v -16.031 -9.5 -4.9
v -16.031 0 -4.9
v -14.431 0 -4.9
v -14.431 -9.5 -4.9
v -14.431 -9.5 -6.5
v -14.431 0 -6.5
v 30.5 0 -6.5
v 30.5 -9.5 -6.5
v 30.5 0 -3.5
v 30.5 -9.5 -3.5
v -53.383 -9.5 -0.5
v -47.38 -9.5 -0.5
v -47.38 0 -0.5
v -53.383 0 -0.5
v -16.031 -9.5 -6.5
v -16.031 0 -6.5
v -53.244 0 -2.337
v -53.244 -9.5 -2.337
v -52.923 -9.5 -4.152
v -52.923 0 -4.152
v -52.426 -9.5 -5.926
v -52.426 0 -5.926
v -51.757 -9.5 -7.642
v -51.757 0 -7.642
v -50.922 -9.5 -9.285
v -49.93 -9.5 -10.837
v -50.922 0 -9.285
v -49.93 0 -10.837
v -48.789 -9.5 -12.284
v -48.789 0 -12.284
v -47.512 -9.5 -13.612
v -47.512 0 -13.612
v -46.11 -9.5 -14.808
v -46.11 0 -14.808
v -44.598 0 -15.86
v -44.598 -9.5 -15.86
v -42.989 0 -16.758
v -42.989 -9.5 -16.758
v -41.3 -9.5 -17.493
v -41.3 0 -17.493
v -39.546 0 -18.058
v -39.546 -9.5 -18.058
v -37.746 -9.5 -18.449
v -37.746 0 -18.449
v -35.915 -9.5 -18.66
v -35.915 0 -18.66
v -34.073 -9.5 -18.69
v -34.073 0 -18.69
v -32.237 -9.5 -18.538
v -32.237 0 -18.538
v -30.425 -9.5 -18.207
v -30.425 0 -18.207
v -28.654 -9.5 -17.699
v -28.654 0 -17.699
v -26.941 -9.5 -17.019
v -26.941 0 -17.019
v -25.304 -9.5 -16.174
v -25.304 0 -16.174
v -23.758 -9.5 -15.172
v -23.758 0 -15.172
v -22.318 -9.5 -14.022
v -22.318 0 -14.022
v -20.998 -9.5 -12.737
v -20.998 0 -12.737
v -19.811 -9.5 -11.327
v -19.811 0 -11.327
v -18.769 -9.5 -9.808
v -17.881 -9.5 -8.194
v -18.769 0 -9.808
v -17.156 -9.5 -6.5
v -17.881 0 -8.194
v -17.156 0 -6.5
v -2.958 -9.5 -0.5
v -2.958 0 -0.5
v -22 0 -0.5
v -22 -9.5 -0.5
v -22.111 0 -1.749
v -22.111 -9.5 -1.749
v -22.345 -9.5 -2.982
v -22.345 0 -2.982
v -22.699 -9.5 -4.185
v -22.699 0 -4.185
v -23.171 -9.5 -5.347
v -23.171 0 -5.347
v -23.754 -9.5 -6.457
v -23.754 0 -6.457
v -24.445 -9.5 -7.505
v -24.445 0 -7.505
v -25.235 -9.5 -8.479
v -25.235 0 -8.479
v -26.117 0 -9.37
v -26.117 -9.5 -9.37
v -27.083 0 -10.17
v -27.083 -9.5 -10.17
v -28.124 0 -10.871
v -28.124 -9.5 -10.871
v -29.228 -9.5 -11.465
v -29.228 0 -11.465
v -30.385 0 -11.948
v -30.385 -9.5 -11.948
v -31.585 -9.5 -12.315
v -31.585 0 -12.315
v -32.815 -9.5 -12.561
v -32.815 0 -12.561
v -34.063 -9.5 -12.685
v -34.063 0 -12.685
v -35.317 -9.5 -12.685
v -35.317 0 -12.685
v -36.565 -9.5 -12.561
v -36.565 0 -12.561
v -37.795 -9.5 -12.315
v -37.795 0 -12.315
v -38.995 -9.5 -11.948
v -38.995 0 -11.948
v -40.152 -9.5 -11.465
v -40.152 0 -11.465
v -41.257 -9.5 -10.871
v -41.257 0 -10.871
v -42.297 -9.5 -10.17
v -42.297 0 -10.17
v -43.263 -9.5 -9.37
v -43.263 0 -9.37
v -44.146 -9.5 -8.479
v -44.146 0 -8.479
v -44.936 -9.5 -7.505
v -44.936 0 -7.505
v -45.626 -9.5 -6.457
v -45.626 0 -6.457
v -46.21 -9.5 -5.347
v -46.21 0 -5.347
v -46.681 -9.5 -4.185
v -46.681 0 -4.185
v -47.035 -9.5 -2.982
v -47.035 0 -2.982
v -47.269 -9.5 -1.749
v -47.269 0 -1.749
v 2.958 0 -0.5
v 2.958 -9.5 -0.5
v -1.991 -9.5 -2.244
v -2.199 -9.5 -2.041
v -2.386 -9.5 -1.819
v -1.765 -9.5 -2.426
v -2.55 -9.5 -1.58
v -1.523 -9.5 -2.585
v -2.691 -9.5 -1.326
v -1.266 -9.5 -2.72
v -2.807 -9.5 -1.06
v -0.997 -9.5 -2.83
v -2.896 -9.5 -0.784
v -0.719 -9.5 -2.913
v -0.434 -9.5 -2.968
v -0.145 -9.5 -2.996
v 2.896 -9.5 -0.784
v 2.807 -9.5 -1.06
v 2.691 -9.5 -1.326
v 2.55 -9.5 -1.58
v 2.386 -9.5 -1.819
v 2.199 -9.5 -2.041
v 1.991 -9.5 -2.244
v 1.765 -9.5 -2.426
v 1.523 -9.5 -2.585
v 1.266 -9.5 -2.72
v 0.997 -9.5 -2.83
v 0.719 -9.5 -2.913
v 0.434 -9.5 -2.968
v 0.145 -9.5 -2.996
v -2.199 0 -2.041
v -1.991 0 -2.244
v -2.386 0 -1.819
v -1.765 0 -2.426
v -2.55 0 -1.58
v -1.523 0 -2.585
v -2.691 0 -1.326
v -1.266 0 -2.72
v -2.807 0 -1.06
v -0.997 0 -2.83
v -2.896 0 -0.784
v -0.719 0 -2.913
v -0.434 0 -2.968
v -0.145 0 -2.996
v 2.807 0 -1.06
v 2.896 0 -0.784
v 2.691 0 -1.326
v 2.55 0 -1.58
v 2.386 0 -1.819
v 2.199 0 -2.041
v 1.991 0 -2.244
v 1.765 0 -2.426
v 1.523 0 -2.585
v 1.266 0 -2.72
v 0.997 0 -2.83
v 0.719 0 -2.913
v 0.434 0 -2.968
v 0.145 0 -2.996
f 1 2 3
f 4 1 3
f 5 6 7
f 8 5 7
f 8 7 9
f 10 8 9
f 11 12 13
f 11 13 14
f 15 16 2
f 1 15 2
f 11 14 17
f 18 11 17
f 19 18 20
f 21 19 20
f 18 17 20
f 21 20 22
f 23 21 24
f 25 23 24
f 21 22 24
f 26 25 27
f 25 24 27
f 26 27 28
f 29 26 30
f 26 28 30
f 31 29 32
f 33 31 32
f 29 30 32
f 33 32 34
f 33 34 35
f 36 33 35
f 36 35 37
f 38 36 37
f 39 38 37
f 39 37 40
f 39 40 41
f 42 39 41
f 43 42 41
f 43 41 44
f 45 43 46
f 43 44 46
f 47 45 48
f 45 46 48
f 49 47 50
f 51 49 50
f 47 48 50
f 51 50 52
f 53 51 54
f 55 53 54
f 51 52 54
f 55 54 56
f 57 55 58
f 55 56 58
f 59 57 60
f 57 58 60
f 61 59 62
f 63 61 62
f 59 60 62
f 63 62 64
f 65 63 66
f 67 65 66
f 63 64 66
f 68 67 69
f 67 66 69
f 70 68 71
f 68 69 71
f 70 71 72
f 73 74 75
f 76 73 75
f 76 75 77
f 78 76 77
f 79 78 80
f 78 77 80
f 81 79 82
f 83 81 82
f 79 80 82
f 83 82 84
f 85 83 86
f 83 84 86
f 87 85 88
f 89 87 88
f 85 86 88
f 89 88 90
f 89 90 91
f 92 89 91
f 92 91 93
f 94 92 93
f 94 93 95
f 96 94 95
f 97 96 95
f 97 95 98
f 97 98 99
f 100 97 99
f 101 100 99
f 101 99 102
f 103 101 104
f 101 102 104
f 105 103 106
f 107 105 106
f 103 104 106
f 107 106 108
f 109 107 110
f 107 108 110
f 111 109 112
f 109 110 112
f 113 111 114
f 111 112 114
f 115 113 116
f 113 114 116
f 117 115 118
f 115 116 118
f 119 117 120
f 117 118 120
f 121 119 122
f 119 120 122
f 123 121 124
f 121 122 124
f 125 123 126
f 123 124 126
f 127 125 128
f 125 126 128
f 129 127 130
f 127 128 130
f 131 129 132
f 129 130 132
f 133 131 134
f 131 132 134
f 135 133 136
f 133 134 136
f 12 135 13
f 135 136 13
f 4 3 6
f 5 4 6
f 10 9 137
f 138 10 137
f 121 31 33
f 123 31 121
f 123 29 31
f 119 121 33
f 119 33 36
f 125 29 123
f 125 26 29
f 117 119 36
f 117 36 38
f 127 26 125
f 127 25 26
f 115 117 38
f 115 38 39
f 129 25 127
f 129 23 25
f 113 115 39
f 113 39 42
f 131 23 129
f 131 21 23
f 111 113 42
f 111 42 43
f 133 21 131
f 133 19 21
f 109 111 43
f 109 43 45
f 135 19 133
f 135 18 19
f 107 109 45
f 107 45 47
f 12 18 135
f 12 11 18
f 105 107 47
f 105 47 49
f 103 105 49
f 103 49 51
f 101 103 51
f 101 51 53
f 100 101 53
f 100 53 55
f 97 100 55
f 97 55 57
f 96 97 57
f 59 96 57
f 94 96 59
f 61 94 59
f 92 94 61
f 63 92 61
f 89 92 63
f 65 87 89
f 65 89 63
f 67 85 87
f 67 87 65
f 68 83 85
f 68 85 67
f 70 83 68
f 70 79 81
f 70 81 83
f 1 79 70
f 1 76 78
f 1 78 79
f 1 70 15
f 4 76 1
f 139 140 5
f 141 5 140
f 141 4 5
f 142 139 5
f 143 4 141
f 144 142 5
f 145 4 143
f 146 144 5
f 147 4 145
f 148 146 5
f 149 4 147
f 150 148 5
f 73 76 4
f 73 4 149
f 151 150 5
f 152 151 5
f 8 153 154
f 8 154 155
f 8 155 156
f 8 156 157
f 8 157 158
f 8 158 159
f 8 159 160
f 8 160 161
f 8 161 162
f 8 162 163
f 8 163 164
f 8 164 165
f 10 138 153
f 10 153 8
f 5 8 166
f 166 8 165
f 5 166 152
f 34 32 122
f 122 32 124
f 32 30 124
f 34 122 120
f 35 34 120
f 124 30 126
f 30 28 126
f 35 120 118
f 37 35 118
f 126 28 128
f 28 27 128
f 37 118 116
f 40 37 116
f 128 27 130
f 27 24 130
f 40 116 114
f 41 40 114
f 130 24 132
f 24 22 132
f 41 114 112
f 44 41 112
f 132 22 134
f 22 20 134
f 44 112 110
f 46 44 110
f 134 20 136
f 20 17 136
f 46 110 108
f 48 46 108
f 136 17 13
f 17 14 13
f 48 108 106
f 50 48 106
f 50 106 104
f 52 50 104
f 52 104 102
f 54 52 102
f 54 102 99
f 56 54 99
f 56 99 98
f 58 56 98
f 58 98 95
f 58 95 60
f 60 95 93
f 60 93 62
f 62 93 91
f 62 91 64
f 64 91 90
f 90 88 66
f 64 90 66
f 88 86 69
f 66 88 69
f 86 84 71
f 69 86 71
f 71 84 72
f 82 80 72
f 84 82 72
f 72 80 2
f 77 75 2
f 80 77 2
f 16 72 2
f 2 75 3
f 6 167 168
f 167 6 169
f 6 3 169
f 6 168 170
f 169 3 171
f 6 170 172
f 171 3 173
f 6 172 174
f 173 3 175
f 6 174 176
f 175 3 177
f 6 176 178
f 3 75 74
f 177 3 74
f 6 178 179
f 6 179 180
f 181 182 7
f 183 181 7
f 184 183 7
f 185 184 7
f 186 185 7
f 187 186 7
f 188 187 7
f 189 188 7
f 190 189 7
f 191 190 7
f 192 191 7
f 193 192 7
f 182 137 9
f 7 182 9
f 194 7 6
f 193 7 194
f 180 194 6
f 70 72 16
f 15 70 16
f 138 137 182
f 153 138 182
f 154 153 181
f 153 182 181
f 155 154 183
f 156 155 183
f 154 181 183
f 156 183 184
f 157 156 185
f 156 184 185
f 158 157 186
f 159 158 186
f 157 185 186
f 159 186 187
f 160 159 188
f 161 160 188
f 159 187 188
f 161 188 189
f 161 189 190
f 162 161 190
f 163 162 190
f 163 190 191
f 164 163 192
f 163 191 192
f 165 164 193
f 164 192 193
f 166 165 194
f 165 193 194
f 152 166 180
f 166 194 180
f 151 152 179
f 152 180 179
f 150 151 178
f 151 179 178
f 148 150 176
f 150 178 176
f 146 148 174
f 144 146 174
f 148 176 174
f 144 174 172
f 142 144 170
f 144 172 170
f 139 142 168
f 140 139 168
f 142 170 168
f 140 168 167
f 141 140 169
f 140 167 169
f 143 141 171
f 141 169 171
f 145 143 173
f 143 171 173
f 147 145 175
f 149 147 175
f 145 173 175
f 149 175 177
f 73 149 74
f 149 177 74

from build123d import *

# Parameters (mm, degrees)
F2_DEPTH = 9.5


with BuildPart() as f2:
    # F1 (on Front) → F2 (new body)
    with BuildSketch(Plane.XZ):
        with BuildLine():
            Line((-14.4312179421, -6.5), (30.5, -6.5))
            Line((30.5, -6.5), (30.5, -3.5))
            Line((30.5, -3.5), (2.9580398915, -0.5))
            ThreePointArc((2.9580398915, -0.5), (0, -3), (-2.9580398915, -0.5))
            Line((-2.9580398915, -0.5), (-17.160677935, -0.5))
            Line((-17.160677935, -0.5), (-17.1837798887, -0.5))
            Line((-17.1837798887, -0.5), (-22, -0.5))
            ThreePointArc((-22, -0.5), (-34.6901536634, -12.7), (-47.3803073267, -0.5))
            Line((-47.3803073267, -0.5), (-53.3834679762, -0.5))
            ThreePointArc((-53.3834679762, -0.5), (-37.745644054, -18.4486850066), (-17.1561866279, -6.5))
            Line((-17.1561866279, -6.5), (-16.0312179421, -6.5))
            Line((-16.0312179421, -6.5), (-16.0312179421, -4.9))
            Line((-16.0312179421, -4.9), (-14.4312179421, -4.9))
            Line((-14.4312179421, -4.9), (-14.4312179421, -6.5))
        make_face()
    extrude(amount=F2_DEPTH)


solid = f2.part
